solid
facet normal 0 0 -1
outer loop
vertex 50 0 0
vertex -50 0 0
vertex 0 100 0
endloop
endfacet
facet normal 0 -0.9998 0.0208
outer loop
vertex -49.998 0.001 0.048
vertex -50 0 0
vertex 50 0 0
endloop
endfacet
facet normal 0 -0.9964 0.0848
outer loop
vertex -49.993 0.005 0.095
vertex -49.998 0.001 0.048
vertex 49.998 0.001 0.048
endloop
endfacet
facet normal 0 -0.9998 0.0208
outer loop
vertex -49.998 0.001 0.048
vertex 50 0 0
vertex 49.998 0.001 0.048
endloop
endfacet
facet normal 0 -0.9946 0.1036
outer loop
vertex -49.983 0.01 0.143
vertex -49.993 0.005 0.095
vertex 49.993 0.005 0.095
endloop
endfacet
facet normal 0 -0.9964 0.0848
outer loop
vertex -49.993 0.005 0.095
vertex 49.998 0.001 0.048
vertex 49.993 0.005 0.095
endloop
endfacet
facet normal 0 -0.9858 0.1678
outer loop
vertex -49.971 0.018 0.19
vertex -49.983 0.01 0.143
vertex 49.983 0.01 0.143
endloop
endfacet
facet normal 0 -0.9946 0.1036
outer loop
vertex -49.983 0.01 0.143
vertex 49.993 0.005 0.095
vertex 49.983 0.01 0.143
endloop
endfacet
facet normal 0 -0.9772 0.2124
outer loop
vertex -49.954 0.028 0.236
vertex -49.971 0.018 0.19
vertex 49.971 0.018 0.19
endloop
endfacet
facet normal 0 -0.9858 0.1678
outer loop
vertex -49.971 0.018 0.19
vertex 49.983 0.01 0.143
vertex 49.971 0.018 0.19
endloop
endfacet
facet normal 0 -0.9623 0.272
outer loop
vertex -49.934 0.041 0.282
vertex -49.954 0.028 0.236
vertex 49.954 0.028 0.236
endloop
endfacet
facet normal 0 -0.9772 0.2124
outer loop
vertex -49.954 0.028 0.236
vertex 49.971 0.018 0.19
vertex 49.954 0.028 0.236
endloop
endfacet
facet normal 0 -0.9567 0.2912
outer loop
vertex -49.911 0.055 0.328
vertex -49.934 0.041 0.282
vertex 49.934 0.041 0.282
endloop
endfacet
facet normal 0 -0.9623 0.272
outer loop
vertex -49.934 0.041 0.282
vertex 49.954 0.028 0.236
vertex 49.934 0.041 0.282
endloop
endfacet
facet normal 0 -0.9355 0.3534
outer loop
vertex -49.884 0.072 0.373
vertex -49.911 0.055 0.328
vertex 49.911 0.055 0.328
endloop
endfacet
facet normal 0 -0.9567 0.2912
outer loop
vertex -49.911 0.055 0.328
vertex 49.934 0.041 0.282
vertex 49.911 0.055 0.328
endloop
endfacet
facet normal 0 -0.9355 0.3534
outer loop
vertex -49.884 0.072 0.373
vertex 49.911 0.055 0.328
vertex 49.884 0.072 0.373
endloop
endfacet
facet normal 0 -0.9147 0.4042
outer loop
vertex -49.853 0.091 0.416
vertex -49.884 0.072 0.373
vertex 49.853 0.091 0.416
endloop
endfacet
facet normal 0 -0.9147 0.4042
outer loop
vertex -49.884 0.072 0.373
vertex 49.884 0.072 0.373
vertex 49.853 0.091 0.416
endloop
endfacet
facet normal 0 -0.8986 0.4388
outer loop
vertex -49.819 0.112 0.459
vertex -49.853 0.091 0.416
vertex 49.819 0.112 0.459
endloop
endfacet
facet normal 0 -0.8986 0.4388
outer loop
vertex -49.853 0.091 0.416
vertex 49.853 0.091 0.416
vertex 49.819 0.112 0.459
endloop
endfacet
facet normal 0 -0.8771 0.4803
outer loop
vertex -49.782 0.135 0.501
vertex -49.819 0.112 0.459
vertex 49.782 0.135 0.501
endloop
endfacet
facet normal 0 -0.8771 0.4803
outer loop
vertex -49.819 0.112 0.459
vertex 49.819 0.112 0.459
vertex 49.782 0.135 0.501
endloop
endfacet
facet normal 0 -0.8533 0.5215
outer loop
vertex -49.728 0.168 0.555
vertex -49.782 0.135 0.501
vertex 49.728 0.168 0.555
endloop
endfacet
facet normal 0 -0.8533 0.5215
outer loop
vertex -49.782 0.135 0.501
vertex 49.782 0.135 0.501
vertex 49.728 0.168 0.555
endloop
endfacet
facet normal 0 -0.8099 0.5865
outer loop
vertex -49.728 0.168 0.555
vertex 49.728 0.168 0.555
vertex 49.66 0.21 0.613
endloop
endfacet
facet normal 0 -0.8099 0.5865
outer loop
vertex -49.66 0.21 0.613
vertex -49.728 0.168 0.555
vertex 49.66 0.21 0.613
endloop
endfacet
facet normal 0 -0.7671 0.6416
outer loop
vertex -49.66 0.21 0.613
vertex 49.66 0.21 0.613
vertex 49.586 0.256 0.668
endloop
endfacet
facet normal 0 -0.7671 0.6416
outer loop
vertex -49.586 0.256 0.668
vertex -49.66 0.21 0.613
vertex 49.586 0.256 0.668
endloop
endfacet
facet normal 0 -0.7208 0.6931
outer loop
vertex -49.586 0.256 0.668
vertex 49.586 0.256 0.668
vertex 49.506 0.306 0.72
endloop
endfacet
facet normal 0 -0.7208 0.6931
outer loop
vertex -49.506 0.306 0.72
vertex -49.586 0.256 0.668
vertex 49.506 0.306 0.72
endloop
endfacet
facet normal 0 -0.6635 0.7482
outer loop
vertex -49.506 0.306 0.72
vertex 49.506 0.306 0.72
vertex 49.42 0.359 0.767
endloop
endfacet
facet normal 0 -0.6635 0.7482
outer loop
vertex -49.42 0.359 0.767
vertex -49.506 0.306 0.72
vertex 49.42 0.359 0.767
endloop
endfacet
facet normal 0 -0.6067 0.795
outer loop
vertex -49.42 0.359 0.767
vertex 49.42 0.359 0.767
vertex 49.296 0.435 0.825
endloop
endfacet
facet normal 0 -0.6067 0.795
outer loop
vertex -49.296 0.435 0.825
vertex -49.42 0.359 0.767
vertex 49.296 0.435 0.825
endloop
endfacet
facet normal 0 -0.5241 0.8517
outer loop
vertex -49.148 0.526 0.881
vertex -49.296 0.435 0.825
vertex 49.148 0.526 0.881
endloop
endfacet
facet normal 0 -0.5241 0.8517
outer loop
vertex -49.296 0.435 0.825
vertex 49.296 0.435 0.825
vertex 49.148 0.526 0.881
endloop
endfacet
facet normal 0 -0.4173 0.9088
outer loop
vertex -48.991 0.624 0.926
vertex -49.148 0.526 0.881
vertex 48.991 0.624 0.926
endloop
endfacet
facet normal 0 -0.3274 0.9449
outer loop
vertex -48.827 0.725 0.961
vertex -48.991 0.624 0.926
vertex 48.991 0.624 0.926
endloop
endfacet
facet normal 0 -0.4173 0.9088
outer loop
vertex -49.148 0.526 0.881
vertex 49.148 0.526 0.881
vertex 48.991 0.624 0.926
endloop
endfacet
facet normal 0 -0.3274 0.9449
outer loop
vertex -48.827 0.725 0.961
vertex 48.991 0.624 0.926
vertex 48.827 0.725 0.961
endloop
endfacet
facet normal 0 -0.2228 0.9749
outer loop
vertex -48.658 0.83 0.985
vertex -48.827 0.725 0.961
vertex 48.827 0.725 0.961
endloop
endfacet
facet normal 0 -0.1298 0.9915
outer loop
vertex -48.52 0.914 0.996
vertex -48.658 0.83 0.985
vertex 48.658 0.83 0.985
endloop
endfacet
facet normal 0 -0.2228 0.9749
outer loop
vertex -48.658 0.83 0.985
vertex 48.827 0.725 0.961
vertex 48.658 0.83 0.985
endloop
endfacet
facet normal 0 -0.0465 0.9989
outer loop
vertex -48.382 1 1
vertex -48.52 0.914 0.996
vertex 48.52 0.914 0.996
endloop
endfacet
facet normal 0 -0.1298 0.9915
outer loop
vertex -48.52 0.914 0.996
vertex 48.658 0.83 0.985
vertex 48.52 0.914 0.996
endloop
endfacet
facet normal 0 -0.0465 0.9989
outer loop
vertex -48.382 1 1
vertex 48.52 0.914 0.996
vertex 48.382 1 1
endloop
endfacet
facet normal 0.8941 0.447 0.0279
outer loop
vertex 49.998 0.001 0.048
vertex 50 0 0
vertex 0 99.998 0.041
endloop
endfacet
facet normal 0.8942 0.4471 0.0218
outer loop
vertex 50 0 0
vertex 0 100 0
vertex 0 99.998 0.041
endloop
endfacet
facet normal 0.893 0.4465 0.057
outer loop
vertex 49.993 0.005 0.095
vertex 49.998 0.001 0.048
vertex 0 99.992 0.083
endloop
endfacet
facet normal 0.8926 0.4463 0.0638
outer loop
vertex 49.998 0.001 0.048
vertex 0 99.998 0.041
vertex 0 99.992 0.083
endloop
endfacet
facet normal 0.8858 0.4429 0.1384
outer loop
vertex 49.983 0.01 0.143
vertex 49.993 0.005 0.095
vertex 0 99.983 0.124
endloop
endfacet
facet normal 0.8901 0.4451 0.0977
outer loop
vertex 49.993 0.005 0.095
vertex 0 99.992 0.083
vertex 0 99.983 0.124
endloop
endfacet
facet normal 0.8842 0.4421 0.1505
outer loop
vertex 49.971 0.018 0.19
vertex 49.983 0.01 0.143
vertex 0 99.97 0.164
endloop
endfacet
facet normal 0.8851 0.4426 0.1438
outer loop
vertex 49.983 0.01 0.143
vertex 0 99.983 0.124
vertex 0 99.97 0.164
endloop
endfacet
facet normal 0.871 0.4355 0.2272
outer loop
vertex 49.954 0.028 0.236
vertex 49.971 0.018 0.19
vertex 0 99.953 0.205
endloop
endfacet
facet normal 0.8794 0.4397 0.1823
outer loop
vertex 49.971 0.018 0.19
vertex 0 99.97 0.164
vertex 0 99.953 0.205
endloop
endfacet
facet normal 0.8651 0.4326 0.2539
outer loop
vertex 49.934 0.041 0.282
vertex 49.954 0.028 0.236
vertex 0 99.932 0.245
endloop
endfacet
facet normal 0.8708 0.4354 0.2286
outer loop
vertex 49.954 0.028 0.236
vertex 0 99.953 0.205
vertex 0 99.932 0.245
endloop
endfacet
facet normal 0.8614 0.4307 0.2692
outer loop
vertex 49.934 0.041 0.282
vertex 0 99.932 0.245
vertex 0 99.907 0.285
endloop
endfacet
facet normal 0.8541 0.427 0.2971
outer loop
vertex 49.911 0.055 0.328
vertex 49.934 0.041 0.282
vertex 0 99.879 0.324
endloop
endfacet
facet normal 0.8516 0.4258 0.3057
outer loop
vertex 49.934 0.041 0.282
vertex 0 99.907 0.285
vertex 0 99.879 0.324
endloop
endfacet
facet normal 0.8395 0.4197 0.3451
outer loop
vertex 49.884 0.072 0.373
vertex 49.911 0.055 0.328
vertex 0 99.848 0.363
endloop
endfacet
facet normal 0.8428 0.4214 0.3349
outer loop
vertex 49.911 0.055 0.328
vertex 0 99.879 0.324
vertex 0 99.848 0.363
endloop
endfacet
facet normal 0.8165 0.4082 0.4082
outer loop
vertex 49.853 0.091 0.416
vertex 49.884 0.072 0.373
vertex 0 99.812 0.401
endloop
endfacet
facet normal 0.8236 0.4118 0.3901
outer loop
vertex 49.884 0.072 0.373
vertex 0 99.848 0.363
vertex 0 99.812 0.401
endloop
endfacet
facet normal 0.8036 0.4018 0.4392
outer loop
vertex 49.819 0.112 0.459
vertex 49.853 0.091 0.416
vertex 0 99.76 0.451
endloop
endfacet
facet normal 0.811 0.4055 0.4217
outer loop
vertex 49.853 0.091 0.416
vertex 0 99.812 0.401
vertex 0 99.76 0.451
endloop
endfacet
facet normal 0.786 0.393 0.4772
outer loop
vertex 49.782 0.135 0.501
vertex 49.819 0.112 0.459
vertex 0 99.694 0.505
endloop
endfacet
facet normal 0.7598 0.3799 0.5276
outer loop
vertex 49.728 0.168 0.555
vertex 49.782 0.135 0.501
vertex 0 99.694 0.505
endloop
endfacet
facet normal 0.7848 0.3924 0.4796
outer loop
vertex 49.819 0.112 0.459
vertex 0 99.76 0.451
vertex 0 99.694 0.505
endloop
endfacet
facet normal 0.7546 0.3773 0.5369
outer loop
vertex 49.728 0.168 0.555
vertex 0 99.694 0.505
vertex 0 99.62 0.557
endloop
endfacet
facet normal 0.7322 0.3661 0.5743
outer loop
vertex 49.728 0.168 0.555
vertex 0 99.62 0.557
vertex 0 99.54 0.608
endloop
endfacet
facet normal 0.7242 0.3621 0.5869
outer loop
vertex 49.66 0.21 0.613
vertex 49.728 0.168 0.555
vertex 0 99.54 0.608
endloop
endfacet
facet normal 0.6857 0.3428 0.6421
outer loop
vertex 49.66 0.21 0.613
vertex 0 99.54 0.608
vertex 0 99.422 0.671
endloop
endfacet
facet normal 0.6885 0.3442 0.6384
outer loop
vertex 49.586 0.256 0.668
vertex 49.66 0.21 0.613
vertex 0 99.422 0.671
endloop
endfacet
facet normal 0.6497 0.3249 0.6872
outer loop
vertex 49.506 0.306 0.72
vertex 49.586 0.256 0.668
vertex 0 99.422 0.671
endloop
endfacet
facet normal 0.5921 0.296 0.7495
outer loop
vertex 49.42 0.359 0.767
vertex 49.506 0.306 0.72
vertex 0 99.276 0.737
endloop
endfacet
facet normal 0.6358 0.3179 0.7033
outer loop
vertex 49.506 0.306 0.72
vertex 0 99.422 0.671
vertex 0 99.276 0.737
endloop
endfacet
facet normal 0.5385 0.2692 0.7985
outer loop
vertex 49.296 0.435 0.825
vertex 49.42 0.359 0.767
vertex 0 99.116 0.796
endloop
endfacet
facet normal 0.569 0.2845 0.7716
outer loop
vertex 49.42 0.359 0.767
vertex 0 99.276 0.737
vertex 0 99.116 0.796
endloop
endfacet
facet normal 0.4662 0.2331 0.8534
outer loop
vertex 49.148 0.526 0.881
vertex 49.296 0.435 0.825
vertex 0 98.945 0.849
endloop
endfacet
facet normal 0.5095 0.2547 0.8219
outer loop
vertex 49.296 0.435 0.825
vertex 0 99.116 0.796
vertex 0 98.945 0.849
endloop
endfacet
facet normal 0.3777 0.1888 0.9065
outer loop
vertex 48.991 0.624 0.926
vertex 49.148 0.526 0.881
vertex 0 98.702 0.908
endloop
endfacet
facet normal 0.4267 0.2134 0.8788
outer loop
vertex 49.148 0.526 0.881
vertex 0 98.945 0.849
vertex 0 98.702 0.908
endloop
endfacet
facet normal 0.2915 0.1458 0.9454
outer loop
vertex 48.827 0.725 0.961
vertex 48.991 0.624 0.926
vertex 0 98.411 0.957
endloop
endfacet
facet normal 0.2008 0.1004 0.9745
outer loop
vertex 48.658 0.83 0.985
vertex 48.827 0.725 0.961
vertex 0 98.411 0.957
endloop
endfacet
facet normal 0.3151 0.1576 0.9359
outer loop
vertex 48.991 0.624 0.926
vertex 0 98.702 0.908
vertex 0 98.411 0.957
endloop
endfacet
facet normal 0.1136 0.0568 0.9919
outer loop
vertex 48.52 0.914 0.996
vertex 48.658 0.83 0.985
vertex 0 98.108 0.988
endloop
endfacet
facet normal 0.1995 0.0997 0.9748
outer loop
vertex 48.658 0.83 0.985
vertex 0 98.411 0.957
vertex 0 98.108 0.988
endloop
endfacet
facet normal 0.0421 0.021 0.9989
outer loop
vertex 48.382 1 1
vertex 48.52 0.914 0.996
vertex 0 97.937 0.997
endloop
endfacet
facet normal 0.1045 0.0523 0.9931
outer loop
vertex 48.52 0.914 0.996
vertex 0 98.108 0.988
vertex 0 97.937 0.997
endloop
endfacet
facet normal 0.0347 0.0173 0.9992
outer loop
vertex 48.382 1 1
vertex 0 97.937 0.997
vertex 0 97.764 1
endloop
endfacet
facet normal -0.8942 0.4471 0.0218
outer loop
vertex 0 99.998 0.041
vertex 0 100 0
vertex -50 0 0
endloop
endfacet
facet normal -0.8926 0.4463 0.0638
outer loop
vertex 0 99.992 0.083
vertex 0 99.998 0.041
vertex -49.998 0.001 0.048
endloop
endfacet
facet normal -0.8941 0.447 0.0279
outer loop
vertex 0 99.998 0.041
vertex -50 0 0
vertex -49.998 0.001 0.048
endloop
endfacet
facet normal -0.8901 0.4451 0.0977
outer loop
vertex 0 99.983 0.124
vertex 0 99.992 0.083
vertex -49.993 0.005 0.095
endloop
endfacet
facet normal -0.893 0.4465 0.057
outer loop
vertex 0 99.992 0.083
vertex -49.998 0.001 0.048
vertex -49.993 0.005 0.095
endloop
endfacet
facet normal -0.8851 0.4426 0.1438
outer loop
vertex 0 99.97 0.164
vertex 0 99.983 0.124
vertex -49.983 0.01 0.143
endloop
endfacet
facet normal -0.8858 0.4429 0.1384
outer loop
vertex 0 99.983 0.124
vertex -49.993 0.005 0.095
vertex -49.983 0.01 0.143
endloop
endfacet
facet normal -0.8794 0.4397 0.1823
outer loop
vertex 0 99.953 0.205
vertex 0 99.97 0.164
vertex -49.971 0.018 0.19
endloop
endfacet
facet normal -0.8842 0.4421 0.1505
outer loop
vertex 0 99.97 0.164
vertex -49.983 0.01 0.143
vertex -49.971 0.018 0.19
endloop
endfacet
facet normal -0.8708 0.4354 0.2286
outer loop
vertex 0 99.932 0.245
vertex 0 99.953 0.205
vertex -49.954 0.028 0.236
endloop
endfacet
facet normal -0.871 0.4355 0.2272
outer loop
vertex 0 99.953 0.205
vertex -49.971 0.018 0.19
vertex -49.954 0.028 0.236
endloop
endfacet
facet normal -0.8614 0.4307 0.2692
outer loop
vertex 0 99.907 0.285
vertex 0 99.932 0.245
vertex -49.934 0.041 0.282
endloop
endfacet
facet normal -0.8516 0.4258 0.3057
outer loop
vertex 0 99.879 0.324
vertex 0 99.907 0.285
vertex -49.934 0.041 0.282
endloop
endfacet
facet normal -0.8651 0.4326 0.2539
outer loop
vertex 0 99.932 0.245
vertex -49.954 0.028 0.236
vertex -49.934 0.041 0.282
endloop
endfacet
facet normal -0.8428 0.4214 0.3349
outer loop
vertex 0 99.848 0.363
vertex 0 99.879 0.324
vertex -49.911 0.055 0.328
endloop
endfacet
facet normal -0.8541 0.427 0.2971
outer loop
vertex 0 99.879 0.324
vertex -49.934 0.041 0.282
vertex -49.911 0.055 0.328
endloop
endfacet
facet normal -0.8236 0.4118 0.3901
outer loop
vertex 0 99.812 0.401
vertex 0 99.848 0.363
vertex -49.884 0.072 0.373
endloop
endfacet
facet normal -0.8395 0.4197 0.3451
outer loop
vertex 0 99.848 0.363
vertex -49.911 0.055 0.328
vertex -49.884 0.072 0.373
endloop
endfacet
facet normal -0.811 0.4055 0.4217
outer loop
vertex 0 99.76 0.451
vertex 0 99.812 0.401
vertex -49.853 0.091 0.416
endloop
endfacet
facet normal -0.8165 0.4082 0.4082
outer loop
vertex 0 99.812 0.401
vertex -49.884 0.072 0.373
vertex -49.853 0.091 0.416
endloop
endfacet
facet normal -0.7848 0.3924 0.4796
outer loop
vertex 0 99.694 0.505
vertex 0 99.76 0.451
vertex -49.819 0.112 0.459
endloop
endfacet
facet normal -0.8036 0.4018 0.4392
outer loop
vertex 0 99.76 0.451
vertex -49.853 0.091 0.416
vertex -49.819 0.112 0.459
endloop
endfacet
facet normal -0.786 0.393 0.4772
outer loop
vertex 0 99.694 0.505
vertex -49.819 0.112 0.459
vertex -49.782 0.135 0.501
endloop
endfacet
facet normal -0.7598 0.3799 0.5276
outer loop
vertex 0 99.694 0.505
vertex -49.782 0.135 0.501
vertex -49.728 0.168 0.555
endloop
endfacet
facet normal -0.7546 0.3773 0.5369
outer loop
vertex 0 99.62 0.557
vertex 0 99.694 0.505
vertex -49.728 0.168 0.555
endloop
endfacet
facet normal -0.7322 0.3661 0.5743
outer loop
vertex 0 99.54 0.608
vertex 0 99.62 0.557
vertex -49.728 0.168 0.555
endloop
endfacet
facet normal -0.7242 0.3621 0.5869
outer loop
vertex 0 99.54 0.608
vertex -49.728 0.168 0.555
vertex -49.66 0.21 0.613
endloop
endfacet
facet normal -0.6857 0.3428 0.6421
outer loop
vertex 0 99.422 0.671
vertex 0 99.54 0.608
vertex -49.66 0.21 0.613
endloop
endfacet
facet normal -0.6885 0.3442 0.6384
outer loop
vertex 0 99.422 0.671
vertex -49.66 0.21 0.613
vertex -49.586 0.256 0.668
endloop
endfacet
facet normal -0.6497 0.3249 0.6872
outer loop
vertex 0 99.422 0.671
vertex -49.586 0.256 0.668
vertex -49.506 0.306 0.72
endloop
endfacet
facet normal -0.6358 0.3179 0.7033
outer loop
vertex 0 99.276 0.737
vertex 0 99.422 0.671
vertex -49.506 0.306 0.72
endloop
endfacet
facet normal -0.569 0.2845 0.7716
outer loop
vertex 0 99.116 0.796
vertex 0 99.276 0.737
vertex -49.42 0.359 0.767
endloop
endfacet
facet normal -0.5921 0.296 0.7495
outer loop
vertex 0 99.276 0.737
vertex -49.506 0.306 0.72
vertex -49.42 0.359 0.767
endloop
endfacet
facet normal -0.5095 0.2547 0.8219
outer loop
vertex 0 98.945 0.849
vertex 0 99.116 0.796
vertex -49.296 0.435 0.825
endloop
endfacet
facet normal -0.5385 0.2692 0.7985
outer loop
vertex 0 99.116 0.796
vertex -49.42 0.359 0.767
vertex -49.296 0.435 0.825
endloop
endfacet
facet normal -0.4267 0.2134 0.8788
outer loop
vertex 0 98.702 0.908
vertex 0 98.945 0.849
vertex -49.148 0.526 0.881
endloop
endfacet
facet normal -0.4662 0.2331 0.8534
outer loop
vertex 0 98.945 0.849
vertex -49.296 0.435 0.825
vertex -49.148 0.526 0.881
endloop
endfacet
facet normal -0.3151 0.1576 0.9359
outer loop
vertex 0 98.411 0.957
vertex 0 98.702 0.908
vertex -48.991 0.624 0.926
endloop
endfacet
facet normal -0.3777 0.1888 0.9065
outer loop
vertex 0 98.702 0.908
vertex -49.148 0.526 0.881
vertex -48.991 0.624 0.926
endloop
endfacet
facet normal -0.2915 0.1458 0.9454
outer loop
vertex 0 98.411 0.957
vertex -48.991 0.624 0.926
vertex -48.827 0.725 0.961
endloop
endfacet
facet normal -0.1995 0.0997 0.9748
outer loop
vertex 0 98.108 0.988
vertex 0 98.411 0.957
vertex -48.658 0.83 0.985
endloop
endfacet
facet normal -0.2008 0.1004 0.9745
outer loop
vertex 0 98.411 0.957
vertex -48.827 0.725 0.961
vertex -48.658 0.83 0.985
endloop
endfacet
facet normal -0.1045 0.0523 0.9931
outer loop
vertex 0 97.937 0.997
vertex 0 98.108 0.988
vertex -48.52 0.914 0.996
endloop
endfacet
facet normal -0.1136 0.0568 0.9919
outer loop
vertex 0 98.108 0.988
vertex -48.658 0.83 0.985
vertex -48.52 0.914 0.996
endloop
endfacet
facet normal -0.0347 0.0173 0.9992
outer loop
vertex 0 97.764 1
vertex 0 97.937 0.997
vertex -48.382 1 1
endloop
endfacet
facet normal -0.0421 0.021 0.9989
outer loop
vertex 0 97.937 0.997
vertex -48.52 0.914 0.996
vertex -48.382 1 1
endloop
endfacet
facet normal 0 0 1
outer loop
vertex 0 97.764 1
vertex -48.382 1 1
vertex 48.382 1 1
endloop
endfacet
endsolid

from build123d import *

# Parameters (mm, degrees)
BOSS_EXTRUDE1_DEPTH = 1
FILLET1_R           = 1


with BuildPart() as part:
    # Sketch1 → Boss-Extrude1 (new body)
    with BuildSketch(Plane.XY):
        Polygon((-50, 0), (50, 0), (0, 100), align=None)
    extrude(amount=BOSS_EXTRUDE1_DEPTH)

    # Fillet1
    fillet1_edges = [part.edges().sort_by_distance(p)[0] for p in [
        (0, 0, 1),
        (-25, 50, 1),
        (25, 50, 1),
    ]]
    fillet(fillet1_edges, radius=FILLET1_R - 0.0001)  # a hair under: the kernel refuses the full size


solid = part.part
